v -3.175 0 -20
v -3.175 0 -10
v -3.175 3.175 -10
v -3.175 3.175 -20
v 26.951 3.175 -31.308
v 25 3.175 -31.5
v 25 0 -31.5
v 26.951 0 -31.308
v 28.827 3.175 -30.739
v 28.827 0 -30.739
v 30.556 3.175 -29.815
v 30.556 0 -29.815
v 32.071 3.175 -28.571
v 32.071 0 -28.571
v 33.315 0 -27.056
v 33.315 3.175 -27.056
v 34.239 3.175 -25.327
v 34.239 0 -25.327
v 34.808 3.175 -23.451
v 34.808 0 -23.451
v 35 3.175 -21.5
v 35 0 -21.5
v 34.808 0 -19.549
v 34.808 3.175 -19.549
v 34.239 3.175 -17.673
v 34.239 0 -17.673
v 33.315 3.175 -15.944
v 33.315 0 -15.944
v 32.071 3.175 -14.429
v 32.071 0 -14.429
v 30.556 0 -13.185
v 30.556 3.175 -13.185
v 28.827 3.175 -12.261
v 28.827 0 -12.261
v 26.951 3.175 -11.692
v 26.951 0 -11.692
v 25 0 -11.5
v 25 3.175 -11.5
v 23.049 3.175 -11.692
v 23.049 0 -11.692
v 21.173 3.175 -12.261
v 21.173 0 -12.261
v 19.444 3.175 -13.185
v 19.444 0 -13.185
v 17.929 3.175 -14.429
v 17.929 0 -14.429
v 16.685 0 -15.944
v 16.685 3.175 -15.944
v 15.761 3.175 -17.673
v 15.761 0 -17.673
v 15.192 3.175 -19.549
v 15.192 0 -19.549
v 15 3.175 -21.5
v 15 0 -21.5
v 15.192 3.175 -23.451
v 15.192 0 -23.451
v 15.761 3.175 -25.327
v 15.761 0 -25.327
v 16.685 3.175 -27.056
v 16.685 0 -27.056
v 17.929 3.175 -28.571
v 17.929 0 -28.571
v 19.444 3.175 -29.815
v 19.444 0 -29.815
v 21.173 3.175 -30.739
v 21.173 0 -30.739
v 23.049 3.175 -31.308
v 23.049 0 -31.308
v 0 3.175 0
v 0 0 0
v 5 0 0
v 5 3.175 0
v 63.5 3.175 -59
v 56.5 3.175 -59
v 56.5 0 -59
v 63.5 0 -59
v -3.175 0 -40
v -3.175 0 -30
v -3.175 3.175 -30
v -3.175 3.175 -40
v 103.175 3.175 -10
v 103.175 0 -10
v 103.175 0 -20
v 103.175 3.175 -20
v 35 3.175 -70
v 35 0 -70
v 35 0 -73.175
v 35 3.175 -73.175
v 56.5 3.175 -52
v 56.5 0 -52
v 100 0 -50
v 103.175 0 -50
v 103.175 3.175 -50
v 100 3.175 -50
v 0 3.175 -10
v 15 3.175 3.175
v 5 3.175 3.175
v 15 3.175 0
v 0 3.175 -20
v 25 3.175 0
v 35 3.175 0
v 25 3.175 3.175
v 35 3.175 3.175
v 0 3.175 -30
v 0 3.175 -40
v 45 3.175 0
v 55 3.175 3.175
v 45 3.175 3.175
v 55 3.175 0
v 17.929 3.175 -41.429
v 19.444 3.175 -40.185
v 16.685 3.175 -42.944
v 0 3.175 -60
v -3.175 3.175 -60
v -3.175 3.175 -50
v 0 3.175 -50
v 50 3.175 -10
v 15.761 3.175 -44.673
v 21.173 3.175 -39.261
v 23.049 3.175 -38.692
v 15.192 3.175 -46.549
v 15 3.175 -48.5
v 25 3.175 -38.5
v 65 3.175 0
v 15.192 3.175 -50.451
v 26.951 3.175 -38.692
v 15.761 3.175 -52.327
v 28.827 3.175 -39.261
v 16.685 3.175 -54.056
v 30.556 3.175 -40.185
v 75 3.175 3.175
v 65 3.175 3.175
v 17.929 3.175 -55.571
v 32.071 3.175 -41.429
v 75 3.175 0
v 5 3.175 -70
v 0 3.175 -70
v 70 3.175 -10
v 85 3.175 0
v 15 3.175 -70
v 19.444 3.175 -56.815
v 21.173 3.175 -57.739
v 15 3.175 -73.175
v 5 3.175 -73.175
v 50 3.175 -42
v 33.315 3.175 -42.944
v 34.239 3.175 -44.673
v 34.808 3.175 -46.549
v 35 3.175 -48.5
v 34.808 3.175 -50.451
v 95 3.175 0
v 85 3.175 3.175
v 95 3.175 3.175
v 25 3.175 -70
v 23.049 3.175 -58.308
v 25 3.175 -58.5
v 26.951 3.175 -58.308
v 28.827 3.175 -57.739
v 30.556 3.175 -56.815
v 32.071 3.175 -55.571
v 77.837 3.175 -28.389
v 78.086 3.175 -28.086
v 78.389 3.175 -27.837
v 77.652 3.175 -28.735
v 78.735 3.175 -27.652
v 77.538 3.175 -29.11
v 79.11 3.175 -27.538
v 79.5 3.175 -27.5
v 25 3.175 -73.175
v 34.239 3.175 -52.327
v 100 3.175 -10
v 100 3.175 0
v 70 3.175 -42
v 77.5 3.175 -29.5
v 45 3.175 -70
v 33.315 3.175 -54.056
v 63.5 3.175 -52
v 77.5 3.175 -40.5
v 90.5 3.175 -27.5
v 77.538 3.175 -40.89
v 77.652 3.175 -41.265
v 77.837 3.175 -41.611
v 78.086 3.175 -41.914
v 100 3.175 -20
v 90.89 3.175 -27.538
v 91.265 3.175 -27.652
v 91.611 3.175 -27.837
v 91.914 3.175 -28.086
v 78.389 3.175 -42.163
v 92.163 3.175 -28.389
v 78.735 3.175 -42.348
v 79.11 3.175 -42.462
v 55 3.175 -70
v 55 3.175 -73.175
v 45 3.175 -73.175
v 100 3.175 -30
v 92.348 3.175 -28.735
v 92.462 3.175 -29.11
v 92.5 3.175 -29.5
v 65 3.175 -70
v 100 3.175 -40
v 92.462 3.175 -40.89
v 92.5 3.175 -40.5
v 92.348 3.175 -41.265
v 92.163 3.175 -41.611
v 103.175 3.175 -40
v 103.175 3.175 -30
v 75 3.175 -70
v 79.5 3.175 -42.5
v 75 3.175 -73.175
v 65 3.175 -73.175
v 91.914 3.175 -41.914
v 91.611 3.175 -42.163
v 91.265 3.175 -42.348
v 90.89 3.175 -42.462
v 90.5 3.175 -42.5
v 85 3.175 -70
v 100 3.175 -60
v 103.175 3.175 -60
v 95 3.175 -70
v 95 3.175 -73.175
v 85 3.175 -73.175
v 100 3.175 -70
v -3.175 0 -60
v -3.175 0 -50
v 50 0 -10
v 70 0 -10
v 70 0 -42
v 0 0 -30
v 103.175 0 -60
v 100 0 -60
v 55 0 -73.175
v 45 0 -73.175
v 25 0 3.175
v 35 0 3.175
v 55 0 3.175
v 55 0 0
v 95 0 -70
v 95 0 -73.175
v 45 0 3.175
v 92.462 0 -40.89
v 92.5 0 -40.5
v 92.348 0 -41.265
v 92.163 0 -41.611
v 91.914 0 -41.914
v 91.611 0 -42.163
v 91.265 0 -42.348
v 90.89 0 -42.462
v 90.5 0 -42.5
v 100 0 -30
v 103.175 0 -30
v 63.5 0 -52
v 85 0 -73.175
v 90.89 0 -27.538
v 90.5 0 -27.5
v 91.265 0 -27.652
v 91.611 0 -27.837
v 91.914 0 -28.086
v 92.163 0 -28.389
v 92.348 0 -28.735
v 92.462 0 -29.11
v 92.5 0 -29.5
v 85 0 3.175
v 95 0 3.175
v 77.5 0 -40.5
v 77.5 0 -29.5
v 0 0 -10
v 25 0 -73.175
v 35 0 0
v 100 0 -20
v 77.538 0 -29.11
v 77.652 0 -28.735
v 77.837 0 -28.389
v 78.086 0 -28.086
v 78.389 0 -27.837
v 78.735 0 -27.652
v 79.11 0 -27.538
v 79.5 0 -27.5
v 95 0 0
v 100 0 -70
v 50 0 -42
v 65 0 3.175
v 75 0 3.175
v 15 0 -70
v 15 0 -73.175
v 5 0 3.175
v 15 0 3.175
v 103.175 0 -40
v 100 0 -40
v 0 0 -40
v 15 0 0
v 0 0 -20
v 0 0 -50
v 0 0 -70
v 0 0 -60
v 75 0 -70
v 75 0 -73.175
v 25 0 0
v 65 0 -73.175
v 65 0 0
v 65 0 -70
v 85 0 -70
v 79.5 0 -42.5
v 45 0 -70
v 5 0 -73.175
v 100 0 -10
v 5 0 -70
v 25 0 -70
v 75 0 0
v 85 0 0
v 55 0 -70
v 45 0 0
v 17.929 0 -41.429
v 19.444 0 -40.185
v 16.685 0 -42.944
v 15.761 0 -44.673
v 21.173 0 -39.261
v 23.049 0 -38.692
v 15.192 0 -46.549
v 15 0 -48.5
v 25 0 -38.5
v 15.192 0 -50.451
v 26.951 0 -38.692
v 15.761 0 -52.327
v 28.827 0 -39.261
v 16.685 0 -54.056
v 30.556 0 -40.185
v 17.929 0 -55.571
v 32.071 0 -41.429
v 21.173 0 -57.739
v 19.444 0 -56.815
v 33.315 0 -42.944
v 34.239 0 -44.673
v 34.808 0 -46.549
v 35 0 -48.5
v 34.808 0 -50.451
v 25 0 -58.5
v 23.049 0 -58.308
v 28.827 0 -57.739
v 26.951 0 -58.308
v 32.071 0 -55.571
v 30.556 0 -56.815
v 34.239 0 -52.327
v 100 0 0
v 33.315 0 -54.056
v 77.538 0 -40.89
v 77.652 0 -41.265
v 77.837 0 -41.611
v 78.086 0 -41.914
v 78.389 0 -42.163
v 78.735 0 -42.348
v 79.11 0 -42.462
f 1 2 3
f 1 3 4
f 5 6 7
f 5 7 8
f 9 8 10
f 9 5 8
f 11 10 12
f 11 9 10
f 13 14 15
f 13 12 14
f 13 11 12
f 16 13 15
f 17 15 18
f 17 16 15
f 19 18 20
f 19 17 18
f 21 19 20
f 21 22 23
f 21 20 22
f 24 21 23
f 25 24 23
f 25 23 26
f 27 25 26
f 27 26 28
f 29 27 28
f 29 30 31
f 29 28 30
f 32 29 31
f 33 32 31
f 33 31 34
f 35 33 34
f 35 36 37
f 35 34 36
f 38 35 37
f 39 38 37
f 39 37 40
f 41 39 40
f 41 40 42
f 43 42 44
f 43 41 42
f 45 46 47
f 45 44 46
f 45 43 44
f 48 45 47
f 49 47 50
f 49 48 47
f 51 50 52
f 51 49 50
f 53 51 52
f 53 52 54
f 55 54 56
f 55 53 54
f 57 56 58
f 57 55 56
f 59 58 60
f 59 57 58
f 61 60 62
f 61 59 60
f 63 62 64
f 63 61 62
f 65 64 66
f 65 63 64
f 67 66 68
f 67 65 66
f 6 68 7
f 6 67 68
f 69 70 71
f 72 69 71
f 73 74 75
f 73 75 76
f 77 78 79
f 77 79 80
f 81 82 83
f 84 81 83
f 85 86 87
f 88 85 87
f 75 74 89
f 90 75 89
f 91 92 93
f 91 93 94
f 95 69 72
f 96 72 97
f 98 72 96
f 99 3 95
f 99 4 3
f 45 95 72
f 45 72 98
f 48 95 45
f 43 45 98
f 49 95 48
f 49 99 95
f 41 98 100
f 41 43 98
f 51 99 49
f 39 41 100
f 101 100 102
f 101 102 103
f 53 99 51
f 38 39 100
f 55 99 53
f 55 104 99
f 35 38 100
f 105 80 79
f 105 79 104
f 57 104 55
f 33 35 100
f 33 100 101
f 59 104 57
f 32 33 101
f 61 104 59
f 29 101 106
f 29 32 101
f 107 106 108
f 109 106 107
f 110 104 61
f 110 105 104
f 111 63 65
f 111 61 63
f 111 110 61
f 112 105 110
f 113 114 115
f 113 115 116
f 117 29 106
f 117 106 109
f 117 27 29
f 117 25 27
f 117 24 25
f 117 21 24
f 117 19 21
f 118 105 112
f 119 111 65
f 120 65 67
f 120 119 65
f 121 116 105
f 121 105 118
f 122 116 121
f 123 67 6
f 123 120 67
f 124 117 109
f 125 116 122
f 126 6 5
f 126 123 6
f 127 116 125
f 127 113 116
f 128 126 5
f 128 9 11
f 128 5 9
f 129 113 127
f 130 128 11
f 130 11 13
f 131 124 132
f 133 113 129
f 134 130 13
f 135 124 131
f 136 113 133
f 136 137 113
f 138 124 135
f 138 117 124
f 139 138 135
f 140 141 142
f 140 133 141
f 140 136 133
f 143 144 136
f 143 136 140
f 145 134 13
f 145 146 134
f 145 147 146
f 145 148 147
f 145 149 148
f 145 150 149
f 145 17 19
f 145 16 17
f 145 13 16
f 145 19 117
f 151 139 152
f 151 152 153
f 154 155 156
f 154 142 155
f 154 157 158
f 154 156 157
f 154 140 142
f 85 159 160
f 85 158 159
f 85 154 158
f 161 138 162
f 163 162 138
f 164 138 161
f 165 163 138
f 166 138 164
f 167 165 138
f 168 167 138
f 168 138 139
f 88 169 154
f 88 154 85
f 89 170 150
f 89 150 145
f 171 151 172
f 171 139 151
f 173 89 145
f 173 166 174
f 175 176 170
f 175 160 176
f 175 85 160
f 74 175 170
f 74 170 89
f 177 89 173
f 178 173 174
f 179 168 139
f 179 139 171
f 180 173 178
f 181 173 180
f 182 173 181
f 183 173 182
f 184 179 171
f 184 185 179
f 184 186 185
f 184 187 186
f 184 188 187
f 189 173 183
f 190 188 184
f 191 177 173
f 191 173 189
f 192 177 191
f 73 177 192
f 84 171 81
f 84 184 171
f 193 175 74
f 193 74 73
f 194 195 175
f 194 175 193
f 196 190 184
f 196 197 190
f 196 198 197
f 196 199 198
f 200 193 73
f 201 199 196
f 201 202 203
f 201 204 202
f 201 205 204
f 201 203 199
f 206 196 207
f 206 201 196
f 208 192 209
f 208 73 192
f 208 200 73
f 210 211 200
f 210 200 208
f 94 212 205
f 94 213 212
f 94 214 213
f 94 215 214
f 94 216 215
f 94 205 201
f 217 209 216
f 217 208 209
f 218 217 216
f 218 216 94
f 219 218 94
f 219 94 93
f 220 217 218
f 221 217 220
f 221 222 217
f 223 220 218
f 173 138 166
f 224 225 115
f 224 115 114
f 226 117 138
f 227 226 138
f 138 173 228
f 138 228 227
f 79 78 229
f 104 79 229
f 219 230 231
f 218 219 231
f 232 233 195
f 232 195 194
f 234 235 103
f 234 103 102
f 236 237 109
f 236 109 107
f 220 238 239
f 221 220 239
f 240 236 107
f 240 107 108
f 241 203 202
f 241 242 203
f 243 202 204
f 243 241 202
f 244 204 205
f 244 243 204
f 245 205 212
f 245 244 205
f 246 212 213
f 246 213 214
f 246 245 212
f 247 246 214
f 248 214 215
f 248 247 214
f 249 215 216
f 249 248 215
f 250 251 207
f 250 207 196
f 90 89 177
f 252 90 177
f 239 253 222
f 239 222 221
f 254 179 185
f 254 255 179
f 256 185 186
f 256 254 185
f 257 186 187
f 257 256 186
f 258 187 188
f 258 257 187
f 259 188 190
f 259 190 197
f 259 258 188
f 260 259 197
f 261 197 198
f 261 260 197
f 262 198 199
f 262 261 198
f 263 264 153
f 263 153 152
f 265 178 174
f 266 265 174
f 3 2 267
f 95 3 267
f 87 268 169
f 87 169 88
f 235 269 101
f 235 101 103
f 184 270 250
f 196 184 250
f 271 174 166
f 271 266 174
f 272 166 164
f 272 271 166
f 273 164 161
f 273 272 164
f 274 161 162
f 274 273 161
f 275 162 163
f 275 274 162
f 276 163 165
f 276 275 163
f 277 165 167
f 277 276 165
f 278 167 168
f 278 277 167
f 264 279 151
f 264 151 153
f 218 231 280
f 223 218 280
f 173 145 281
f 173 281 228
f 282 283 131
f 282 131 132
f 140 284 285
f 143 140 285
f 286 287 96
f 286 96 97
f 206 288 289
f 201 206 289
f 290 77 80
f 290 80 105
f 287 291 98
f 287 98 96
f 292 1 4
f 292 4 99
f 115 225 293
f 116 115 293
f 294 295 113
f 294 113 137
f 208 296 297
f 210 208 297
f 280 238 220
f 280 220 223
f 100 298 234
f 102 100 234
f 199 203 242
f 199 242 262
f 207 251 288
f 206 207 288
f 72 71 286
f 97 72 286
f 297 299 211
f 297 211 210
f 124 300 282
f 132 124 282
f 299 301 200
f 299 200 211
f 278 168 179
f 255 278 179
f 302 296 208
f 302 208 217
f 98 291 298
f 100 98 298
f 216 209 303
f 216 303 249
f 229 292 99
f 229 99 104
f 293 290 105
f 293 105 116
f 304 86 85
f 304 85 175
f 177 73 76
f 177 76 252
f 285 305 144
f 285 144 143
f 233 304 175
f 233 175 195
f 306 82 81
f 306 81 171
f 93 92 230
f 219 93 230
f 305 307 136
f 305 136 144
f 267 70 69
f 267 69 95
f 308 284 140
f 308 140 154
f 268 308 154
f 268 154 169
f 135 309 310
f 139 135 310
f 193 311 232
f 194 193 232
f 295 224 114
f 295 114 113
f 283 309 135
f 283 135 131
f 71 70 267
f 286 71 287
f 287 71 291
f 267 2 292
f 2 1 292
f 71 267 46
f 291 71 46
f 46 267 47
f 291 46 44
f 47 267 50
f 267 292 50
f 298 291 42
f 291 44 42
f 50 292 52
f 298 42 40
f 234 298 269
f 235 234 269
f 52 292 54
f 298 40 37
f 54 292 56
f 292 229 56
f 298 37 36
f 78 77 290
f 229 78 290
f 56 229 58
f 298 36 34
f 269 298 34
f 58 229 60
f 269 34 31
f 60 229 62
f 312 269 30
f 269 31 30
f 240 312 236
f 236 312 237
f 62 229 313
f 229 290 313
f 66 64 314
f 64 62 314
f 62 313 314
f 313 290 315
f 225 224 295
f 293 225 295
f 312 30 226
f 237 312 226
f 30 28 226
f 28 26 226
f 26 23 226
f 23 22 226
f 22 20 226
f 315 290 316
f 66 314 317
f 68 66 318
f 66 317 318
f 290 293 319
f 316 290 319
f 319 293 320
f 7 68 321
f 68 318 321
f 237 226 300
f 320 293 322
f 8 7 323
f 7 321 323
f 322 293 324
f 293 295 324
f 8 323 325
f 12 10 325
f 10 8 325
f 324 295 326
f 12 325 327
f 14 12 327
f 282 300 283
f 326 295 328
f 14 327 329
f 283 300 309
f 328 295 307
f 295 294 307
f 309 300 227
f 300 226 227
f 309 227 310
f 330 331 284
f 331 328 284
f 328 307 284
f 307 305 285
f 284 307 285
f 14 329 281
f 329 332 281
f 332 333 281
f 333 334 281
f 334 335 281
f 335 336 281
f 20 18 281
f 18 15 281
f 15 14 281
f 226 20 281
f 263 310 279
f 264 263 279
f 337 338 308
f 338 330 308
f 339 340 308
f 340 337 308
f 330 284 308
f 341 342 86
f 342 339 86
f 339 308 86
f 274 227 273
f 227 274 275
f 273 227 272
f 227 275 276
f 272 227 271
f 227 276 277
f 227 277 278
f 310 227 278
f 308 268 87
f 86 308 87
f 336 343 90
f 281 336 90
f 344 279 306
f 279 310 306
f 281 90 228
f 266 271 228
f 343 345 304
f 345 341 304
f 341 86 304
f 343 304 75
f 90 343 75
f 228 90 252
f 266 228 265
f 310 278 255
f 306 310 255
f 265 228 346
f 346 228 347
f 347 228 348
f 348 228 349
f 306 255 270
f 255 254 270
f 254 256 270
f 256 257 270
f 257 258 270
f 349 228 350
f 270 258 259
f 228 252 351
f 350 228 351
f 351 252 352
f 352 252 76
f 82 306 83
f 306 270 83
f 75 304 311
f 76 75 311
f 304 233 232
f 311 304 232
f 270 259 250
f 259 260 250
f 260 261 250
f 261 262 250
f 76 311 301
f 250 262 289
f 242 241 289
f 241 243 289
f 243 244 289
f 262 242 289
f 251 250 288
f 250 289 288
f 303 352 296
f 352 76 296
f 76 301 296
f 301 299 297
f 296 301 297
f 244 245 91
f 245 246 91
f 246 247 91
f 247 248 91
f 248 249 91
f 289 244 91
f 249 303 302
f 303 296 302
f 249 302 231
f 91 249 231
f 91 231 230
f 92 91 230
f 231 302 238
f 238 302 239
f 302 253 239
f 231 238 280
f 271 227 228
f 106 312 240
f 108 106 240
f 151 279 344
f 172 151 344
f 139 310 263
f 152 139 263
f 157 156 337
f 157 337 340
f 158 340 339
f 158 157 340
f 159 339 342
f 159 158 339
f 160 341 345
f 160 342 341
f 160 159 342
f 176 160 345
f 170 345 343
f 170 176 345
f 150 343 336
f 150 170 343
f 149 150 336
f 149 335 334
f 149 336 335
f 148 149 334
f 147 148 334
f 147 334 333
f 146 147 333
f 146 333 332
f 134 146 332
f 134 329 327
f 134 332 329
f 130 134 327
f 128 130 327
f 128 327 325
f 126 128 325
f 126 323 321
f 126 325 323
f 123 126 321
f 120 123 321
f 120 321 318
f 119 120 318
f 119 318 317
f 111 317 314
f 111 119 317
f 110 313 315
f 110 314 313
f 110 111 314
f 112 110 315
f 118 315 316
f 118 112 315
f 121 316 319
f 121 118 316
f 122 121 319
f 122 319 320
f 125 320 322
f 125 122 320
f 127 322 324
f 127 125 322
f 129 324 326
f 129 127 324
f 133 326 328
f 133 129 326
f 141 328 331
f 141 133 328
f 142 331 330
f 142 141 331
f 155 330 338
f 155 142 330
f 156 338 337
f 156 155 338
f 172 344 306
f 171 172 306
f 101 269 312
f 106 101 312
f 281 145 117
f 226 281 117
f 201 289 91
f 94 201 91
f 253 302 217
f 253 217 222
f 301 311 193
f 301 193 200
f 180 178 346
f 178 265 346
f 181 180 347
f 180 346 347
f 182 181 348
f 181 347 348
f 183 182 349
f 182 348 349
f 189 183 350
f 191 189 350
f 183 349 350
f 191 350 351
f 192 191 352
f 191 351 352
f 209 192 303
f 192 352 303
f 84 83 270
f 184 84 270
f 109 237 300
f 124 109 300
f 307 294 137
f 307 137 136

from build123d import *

# Parameters (mm, degrees)
SKETCH1_W                 = 100
SKETCH1_H                 = 70
BOSS_EXTRUDE1_DEPTH       = 3.175
SKETCH3_W                 = 3.175
SKETCH3_H                 = 10
SKETCH3_W_2               = 10
SKETCH3_H_2               = 3.175
BOSS_EXTRUDE2_DEPTH       = 3.175
MIRROR2_COPY_1_SKETCH_W   = 3.175
MIRROR2_COPY_1_SKETCH_H   = 10
MIRROR2_COPY_1_SKETCH_W_2 = 10
MIRROR2_COPY_1_SKETCH_H_2 = 3.175
MIRROR2_COPY_1_DEPTH      = 3.175
MIRROR2_COPY_2_SKETCH_W   = 3.175
MIRROR2_COPY_2_SKETCH_H   = 10
MIRROR2_COPY_2_SKETCH_W_2 = 10
MIRROR2_COPY_2_SKETCH_H_2 = 3.175
MIRROR2_COPY_2_DEPTH      = 3.175
CUT_EXTRUDE1_DEPTH        = 127.529608689
CUT_EXTRUDE1_DEPTH_BACK   = 127.529608689
SKETCH4_W                 = 20
SKETCH4_H                 = 32
SKETCH4_W_2               = 7
SKETCH4_H_2               = 7
SKETCH4_W_3               = 15
SKETCH4_H_3               = 15
FILLET1_R                 = 2
CUT_EXTRUDE2_DEPTH        = 127.529608689
CUT_EXTRUDE2_DEPTH_BACK   = 127.529608689
SKETCH5_R                 = 10


with BuildPart() as part:
    # Sketch1 → Boss-Extrude1 (new body)
    with BuildSketch(Plane(origin=(0, 0, 0), x_dir=(1, 0, 0), z_dir=(0, 1, 0))):
        with Locations((50, 35)):
            Rectangle(SKETCH1_W, SKETCH1_H)
    extrude(amount=BOSS_EXTRUDE1_DEPTH)

    # Sketch3 → Boss-Extrude2 (add)
    with BuildSketch(Plane(origin=(0, 0, 0), x_dir=(1, 0, 0), z_dir=(0, 1, 0))):
        with Locations((-1.5875, 55)):
            Rectangle(SKETCH3_W, SKETCH3_H)
        with Locations((-1.5875, 35)):
            Rectangle(SKETCH3_W, SKETCH3_H)
        with Locations((-1.5875, 15)):
            Rectangle(SKETCH3_W, SKETCH3_H)
        with Locations((30, 71.5875)):
            Rectangle(SKETCH3_W_2, SKETCH3_H_2)
        with Locations((70, 71.5875)):
            Rectangle(SKETCH3_W_2, SKETCH3_H_2)
        with Locations((90, 71.5875)):
            Rectangle(SKETCH3_W_2, SKETCH3_H_2)
        with Locations((10, 71.5875)):
            Rectangle(SKETCH3_W_2, SKETCH3_H_2)
        with Locations((50, 71.5875)):
            Rectangle(SKETCH3_W_2, SKETCH3_H_2)
    boss_extrude2 = extrude(amount=BOSS_EXTRUDE2_DEPTH)

    # Mirror1: Boss-Extrude2 across plane
    add(boss_extrude2.mirror(Plane(origin=(50, 0, 0), x_dir=(0, 0, 1), z_dir=(1, 0, 0))))

    # Mirror2 copy 1 sketch → Mirror2 copy 1 (add)
    with BuildSketch(Plane(origin=(100, 0, -70), x_dir=(-1, 0, 0), z_dir=(0, 1, 0))):
        with Locations((-1.5875, 55)):
            Rectangle(MIRROR2_COPY_1_SKETCH_W, MIRROR2_COPY_1_SKETCH_H)
        with Locations((-1.5875, 35)):
            Rectangle(MIRROR2_COPY_1_SKETCH_W, MIRROR2_COPY_1_SKETCH_H)
        with Locations((-1.5875, 15)):
            Rectangle(MIRROR2_COPY_1_SKETCH_W, MIRROR2_COPY_1_SKETCH_H)
        with Locations((30, 71.5875)):
            Rectangle(MIRROR2_COPY_1_SKETCH_W_2, MIRROR2_COPY_1_SKETCH_H_2)
        with Locations((70, 71.5875)):
            Rectangle(MIRROR2_COPY_1_SKETCH_W_2, MIRROR2_COPY_1_SKETCH_H_2)
        with Locations((90, 71.5875)):
            Rectangle(MIRROR2_COPY_1_SKETCH_W_2, MIRROR2_COPY_1_SKETCH_H_2)
        with Locations((10, 71.5875)):
            Rectangle(MIRROR2_COPY_1_SKETCH_W_2, MIRROR2_COPY_1_SKETCH_H_2)
        with Locations((50, 71.5875)):
            Rectangle(MIRROR2_COPY_1_SKETCH_W_2, MIRROR2_COPY_1_SKETCH_H_2)
    extrude(amount=MIRROR2_COPY_1_DEPTH)

    # Mirror2 copy 2 sketch → Mirror2 copy 2 (add)
    with BuildSketch(Plane(origin=(0, 0, -70), x_dir=(1, 0, 0), z_dir=(0, 1, 0))):
        with Locations((-1.5875, -55)):
            Rectangle(MIRROR2_COPY_2_SKETCH_W, MIRROR2_COPY_2_SKETCH_H)
        with Locations((-1.5875, -35)):
            Rectangle(MIRROR2_COPY_2_SKETCH_W, MIRROR2_COPY_2_SKETCH_H)
        with Locations((-1.5875, -15)):
            Rectangle(MIRROR2_COPY_2_SKETCH_W, MIRROR2_COPY_2_SKETCH_H)
        with Locations((30, -71.5875)):
            Rectangle(MIRROR2_COPY_2_SKETCH_W_2, MIRROR2_COPY_2_SKETCH_H_2)
        with Locations((70, -71.5875)):
            Rectangle(MIRROR2_COPY_2_SKETCH_W_2, MIRROR2_COPY_2_SKETCH_H_2)
        with Locations((90, -71.5875)):
            Rectangle(MIRROR2_COPY_2_SKETCH_W_2, MIRROR2_COPY_2_SKETCH_H_2)
        with Locations((10, -71.5875)):
            Rectangle(MIRROR2_COPY_2_SKETCH_W_2, MIRROR2_COPY_2_SKETCH_H_2)
        with Locations((50, -71.5875)):
            Rectangle(MIRROR2_COPY_2_SKETCH_W_2, MIRROR2_COPY_2_SKETCH_H_2)
    extrude(amount=MIRROR2_COPY_2_DEPTH)

    # Sketch4 → Cut-Extrude1 (cut, two sides: drawn at the far end of the back side and taken through both)
    with BuildSketch(Plane.XZ.offset(-CUT_EXTRUDE1_DEPTH_BACK)):
        with Locations((60, -26)):
            Rectangle(SKETCH4_W, SKETCH4_H)
        with Locations((60, -55.5)):
            Rectangle(SKETCH4_W_2, SKETCH4_H_2)
        with Locations((85, -35)):
            Rectangle(SKETCH4_W_3, SKETCH4_H_3)
    extrude(amount=CUT_EXTRUDE1_DEPTH + CUT_EXTRUDE1_DEPTH_BACK, mode=Mode.SUBTRACT)

    # Fillet1
    fillet1_edges = [part.edges().sort_by_distance(p)[0] for p in [
        (77.5, 1.5875, -42.5),
        (77.5, 1.5875, -27.5),
        (92.5, 1.5875, -27.5),
        (92.5, 1.5875, -42.5),
    ]]
    fillet(fillet1_edges, radius=FILLET1_R)

    # Sketch5 → Cut-Extrude2 (cut, two sides: drawn at the far end of the back side and taken through both)
    with BuildSketch(Plane.XZ.offset(-CUT_EXTRUDE2_DEPTH_BACK)):
        with Locations(Location((25, -48.5, 0), (0, 0, 270))):
            Circle(SKETCH5_R)
        with Locations(Location((25, -21.5, 0), (0, 0, 270))):
            Circle(SKETCH5_R)
    extrude(amount=CUT_EXTRUDE2_DEPTH + CUT_EXTRUDE2_DEPTH_BACK, mode=Mode.SUBTRACT)


solid = part.part
